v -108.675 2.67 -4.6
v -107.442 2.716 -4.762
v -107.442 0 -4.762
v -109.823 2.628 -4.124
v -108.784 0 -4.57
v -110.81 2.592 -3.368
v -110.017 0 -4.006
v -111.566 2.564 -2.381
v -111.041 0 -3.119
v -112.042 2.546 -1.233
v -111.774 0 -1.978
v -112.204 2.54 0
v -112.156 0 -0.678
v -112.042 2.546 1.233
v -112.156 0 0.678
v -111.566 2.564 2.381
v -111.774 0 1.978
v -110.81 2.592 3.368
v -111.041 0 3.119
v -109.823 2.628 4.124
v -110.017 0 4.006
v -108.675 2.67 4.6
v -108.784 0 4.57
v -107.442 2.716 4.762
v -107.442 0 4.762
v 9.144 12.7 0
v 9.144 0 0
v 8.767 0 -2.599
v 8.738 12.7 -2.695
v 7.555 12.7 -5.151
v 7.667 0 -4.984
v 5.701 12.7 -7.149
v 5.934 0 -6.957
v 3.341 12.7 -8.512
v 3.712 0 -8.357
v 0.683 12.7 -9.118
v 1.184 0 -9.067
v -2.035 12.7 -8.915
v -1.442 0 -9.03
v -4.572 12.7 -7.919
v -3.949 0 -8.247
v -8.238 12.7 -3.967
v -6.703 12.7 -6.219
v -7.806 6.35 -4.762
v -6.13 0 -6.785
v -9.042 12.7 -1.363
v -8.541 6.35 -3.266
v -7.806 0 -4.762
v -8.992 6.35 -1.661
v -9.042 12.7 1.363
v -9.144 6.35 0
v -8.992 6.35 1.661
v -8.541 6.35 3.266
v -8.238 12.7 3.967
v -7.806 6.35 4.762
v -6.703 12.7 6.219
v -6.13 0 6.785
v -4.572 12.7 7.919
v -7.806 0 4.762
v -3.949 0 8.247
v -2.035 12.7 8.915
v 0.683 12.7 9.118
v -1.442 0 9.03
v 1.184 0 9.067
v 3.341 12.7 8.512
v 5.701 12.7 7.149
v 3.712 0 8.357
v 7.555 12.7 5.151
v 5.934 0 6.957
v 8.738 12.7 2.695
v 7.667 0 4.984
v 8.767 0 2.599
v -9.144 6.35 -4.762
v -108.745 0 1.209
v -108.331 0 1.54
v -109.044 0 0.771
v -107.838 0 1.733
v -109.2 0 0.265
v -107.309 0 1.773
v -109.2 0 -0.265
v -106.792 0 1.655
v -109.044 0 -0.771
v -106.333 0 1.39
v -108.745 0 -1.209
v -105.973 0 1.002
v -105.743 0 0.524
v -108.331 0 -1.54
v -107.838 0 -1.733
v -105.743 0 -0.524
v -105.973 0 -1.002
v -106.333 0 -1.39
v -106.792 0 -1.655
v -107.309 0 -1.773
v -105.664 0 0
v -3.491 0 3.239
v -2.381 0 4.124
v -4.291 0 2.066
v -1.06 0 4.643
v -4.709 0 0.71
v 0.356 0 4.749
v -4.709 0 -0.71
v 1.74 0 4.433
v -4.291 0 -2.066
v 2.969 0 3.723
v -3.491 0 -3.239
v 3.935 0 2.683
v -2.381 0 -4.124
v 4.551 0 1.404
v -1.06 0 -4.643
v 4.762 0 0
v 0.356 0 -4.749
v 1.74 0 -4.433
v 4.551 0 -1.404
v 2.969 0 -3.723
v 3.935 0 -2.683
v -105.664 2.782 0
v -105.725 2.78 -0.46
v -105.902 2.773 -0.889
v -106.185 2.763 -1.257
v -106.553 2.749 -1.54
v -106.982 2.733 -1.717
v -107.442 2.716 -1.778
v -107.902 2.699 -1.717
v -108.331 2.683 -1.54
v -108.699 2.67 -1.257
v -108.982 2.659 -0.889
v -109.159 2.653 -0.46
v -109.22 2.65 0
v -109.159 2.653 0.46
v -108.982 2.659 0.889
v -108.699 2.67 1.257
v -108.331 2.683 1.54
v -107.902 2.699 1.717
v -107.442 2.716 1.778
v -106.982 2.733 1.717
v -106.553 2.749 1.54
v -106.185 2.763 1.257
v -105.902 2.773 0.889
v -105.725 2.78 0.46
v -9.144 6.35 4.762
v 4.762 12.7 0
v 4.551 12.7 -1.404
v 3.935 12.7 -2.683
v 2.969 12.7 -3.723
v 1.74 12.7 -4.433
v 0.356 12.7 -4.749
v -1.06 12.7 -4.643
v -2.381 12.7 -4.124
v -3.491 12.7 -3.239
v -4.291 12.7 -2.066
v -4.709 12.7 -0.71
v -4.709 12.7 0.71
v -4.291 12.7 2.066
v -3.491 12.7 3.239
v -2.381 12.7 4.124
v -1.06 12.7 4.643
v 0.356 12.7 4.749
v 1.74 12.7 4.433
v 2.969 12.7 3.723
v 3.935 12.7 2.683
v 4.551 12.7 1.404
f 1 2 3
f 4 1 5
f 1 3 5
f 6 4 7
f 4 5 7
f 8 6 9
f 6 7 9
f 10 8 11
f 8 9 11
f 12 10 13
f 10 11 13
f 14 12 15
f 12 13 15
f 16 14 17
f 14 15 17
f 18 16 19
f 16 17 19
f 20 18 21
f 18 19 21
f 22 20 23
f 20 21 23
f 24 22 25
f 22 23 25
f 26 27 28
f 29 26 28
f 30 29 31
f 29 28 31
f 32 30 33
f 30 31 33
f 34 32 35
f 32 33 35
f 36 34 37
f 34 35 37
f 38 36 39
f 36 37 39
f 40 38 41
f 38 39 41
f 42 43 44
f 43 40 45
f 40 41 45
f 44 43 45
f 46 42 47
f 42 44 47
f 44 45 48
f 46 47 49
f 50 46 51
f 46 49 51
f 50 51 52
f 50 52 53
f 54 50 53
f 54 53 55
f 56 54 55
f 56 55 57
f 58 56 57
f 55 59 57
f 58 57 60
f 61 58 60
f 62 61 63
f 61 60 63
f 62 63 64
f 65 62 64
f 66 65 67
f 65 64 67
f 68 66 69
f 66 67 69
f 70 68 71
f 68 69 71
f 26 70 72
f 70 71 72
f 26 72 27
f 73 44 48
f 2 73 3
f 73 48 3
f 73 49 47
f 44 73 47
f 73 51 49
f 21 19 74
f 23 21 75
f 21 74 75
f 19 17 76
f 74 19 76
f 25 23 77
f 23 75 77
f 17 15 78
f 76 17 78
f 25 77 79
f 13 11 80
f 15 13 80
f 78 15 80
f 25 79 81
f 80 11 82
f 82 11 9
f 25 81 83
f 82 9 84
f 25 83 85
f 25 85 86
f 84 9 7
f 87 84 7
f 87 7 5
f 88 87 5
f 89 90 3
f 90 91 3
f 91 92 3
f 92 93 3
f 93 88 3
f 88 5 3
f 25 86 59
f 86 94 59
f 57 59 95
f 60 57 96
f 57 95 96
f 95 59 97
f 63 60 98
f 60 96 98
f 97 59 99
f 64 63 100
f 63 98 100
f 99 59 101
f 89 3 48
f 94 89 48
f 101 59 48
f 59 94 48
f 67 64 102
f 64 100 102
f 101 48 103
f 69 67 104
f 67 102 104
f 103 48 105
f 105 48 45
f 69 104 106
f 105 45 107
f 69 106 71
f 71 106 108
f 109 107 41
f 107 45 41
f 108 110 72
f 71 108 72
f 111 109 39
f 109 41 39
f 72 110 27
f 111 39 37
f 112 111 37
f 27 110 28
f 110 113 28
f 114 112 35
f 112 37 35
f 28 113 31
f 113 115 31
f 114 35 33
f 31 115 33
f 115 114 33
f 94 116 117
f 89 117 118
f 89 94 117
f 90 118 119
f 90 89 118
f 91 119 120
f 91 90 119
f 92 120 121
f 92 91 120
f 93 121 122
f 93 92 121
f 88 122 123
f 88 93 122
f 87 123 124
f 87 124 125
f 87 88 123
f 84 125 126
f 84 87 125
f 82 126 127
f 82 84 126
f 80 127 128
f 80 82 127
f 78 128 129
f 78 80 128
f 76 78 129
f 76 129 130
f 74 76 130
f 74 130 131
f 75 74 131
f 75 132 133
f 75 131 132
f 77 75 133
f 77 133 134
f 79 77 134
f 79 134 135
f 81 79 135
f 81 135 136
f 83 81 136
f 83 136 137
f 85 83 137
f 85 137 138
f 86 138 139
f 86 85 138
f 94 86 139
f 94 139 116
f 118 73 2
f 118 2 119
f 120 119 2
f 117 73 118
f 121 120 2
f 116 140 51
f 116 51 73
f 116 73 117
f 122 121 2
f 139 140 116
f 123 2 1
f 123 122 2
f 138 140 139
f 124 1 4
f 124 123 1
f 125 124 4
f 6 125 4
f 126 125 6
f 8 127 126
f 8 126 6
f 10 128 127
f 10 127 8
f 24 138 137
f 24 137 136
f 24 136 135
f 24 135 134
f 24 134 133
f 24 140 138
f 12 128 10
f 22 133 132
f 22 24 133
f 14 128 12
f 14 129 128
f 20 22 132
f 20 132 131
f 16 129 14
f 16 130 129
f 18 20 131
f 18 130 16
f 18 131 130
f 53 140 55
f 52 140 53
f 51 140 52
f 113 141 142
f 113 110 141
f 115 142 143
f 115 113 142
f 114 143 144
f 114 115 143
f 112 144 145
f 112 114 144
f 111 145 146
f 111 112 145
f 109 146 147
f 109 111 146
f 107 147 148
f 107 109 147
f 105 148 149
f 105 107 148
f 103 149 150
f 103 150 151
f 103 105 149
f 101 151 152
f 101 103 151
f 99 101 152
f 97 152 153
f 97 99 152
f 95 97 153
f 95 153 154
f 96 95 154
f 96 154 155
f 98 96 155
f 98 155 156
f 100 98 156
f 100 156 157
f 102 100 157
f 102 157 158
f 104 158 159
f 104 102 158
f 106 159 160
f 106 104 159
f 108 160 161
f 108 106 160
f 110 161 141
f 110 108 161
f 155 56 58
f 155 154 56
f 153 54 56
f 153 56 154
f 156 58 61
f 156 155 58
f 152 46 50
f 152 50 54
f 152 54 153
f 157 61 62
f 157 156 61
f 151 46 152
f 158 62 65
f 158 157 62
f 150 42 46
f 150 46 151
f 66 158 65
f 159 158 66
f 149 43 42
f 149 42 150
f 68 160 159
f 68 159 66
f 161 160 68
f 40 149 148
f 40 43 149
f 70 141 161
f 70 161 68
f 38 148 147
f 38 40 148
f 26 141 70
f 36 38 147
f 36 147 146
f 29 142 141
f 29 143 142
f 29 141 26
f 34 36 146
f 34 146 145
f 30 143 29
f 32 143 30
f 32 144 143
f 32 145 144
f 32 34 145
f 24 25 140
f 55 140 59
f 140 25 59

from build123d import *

# Parameters (mm, degrees)
SKETCH1_R               = 9.144
SKETCH1_R_2             = 4.7625
BOSS_EXTRUDE1_DEPTH     = 12.7
SKETCH2_R               = 1.778
BOSS_EXTRUDE2_DEPTH     = 6.35
SKETCH3_R               = 4.7625
CUT_EXTRUDE1_DEPTH      = 13.97
CUT_EXTRUDE3_DEPTH      = 10.144
CUT_EXTRUDE3_DEPTH_BACK = 10.144


with BuildPart() as part:
    # Sketch1 → Boss-Extrude1 (new body)
    with BuildSketch(Plane(origin=(0, 0, 0), x_dir=(1, 0, 0), z_dir=(0, 1, 0))):
        Circle(SKETCH1_R)
        Circle(SKETCH1_R_2, mode=Mode.SUBTRACT)
    extrude(amount=BOSS_EXTRUDE1_DEPTH)

    # Sketch2 → Boss-Extrude2 (add)
    with BuildSketch(Plane(origin=(0, 0, 0), x_dir=(1, 0, 0), z_dir=(0, 1, 0))):
        with BuildLine():
            Line((0, -4.7625), (0, 4.7625))
            Line((0, 4.7625), (-107.442, 4.7625))
            ThreePointArc((-107.442, 4.7625), (-112.2045, 0), (-107.442, -4.7625))
            Line((-107.442, -4.7625), (0, -4.7625))
        make_face()
        with Locations((-107.442, 0)):
            Circle(SKETCH2_R, mode=Mode.SUBTRACT)
    extrude(amount=BOSS_EXTRUDE2_DEPTH)

    # Sketch3 → Cut-Extrude1 (cut)
    with BuildSketch(Plane(origin=(0, 12.7, 0), x_dir=(1, 0, 0), z_dir=(0, 1, 0))):
        Circle(SKETCH3_R)
    extrude(amount=-CUT_EXTRUDE1_DEPTH, mode=Mode.SUBTRACT)

    # Sketch4 → Cut-Extrude3 (cut, two sides)
    with BuildSketch(Plane.XY) as cut_extrude3_sk:
        Polygon((-112.2045, 2.54), (-112.2045, 6.35), (-9.144, 6.35), align=None)
    extrude(amount=CUT_EXTRUDE3_DEPTH, mode=Mode.SUBTRACT)
    extrude(cut_extrude3_sk.sketch, amount=-CUT_EXTRUDE3_DEPTH_BACK, mode=Mode.SUBTRACT)


solid = part.part
